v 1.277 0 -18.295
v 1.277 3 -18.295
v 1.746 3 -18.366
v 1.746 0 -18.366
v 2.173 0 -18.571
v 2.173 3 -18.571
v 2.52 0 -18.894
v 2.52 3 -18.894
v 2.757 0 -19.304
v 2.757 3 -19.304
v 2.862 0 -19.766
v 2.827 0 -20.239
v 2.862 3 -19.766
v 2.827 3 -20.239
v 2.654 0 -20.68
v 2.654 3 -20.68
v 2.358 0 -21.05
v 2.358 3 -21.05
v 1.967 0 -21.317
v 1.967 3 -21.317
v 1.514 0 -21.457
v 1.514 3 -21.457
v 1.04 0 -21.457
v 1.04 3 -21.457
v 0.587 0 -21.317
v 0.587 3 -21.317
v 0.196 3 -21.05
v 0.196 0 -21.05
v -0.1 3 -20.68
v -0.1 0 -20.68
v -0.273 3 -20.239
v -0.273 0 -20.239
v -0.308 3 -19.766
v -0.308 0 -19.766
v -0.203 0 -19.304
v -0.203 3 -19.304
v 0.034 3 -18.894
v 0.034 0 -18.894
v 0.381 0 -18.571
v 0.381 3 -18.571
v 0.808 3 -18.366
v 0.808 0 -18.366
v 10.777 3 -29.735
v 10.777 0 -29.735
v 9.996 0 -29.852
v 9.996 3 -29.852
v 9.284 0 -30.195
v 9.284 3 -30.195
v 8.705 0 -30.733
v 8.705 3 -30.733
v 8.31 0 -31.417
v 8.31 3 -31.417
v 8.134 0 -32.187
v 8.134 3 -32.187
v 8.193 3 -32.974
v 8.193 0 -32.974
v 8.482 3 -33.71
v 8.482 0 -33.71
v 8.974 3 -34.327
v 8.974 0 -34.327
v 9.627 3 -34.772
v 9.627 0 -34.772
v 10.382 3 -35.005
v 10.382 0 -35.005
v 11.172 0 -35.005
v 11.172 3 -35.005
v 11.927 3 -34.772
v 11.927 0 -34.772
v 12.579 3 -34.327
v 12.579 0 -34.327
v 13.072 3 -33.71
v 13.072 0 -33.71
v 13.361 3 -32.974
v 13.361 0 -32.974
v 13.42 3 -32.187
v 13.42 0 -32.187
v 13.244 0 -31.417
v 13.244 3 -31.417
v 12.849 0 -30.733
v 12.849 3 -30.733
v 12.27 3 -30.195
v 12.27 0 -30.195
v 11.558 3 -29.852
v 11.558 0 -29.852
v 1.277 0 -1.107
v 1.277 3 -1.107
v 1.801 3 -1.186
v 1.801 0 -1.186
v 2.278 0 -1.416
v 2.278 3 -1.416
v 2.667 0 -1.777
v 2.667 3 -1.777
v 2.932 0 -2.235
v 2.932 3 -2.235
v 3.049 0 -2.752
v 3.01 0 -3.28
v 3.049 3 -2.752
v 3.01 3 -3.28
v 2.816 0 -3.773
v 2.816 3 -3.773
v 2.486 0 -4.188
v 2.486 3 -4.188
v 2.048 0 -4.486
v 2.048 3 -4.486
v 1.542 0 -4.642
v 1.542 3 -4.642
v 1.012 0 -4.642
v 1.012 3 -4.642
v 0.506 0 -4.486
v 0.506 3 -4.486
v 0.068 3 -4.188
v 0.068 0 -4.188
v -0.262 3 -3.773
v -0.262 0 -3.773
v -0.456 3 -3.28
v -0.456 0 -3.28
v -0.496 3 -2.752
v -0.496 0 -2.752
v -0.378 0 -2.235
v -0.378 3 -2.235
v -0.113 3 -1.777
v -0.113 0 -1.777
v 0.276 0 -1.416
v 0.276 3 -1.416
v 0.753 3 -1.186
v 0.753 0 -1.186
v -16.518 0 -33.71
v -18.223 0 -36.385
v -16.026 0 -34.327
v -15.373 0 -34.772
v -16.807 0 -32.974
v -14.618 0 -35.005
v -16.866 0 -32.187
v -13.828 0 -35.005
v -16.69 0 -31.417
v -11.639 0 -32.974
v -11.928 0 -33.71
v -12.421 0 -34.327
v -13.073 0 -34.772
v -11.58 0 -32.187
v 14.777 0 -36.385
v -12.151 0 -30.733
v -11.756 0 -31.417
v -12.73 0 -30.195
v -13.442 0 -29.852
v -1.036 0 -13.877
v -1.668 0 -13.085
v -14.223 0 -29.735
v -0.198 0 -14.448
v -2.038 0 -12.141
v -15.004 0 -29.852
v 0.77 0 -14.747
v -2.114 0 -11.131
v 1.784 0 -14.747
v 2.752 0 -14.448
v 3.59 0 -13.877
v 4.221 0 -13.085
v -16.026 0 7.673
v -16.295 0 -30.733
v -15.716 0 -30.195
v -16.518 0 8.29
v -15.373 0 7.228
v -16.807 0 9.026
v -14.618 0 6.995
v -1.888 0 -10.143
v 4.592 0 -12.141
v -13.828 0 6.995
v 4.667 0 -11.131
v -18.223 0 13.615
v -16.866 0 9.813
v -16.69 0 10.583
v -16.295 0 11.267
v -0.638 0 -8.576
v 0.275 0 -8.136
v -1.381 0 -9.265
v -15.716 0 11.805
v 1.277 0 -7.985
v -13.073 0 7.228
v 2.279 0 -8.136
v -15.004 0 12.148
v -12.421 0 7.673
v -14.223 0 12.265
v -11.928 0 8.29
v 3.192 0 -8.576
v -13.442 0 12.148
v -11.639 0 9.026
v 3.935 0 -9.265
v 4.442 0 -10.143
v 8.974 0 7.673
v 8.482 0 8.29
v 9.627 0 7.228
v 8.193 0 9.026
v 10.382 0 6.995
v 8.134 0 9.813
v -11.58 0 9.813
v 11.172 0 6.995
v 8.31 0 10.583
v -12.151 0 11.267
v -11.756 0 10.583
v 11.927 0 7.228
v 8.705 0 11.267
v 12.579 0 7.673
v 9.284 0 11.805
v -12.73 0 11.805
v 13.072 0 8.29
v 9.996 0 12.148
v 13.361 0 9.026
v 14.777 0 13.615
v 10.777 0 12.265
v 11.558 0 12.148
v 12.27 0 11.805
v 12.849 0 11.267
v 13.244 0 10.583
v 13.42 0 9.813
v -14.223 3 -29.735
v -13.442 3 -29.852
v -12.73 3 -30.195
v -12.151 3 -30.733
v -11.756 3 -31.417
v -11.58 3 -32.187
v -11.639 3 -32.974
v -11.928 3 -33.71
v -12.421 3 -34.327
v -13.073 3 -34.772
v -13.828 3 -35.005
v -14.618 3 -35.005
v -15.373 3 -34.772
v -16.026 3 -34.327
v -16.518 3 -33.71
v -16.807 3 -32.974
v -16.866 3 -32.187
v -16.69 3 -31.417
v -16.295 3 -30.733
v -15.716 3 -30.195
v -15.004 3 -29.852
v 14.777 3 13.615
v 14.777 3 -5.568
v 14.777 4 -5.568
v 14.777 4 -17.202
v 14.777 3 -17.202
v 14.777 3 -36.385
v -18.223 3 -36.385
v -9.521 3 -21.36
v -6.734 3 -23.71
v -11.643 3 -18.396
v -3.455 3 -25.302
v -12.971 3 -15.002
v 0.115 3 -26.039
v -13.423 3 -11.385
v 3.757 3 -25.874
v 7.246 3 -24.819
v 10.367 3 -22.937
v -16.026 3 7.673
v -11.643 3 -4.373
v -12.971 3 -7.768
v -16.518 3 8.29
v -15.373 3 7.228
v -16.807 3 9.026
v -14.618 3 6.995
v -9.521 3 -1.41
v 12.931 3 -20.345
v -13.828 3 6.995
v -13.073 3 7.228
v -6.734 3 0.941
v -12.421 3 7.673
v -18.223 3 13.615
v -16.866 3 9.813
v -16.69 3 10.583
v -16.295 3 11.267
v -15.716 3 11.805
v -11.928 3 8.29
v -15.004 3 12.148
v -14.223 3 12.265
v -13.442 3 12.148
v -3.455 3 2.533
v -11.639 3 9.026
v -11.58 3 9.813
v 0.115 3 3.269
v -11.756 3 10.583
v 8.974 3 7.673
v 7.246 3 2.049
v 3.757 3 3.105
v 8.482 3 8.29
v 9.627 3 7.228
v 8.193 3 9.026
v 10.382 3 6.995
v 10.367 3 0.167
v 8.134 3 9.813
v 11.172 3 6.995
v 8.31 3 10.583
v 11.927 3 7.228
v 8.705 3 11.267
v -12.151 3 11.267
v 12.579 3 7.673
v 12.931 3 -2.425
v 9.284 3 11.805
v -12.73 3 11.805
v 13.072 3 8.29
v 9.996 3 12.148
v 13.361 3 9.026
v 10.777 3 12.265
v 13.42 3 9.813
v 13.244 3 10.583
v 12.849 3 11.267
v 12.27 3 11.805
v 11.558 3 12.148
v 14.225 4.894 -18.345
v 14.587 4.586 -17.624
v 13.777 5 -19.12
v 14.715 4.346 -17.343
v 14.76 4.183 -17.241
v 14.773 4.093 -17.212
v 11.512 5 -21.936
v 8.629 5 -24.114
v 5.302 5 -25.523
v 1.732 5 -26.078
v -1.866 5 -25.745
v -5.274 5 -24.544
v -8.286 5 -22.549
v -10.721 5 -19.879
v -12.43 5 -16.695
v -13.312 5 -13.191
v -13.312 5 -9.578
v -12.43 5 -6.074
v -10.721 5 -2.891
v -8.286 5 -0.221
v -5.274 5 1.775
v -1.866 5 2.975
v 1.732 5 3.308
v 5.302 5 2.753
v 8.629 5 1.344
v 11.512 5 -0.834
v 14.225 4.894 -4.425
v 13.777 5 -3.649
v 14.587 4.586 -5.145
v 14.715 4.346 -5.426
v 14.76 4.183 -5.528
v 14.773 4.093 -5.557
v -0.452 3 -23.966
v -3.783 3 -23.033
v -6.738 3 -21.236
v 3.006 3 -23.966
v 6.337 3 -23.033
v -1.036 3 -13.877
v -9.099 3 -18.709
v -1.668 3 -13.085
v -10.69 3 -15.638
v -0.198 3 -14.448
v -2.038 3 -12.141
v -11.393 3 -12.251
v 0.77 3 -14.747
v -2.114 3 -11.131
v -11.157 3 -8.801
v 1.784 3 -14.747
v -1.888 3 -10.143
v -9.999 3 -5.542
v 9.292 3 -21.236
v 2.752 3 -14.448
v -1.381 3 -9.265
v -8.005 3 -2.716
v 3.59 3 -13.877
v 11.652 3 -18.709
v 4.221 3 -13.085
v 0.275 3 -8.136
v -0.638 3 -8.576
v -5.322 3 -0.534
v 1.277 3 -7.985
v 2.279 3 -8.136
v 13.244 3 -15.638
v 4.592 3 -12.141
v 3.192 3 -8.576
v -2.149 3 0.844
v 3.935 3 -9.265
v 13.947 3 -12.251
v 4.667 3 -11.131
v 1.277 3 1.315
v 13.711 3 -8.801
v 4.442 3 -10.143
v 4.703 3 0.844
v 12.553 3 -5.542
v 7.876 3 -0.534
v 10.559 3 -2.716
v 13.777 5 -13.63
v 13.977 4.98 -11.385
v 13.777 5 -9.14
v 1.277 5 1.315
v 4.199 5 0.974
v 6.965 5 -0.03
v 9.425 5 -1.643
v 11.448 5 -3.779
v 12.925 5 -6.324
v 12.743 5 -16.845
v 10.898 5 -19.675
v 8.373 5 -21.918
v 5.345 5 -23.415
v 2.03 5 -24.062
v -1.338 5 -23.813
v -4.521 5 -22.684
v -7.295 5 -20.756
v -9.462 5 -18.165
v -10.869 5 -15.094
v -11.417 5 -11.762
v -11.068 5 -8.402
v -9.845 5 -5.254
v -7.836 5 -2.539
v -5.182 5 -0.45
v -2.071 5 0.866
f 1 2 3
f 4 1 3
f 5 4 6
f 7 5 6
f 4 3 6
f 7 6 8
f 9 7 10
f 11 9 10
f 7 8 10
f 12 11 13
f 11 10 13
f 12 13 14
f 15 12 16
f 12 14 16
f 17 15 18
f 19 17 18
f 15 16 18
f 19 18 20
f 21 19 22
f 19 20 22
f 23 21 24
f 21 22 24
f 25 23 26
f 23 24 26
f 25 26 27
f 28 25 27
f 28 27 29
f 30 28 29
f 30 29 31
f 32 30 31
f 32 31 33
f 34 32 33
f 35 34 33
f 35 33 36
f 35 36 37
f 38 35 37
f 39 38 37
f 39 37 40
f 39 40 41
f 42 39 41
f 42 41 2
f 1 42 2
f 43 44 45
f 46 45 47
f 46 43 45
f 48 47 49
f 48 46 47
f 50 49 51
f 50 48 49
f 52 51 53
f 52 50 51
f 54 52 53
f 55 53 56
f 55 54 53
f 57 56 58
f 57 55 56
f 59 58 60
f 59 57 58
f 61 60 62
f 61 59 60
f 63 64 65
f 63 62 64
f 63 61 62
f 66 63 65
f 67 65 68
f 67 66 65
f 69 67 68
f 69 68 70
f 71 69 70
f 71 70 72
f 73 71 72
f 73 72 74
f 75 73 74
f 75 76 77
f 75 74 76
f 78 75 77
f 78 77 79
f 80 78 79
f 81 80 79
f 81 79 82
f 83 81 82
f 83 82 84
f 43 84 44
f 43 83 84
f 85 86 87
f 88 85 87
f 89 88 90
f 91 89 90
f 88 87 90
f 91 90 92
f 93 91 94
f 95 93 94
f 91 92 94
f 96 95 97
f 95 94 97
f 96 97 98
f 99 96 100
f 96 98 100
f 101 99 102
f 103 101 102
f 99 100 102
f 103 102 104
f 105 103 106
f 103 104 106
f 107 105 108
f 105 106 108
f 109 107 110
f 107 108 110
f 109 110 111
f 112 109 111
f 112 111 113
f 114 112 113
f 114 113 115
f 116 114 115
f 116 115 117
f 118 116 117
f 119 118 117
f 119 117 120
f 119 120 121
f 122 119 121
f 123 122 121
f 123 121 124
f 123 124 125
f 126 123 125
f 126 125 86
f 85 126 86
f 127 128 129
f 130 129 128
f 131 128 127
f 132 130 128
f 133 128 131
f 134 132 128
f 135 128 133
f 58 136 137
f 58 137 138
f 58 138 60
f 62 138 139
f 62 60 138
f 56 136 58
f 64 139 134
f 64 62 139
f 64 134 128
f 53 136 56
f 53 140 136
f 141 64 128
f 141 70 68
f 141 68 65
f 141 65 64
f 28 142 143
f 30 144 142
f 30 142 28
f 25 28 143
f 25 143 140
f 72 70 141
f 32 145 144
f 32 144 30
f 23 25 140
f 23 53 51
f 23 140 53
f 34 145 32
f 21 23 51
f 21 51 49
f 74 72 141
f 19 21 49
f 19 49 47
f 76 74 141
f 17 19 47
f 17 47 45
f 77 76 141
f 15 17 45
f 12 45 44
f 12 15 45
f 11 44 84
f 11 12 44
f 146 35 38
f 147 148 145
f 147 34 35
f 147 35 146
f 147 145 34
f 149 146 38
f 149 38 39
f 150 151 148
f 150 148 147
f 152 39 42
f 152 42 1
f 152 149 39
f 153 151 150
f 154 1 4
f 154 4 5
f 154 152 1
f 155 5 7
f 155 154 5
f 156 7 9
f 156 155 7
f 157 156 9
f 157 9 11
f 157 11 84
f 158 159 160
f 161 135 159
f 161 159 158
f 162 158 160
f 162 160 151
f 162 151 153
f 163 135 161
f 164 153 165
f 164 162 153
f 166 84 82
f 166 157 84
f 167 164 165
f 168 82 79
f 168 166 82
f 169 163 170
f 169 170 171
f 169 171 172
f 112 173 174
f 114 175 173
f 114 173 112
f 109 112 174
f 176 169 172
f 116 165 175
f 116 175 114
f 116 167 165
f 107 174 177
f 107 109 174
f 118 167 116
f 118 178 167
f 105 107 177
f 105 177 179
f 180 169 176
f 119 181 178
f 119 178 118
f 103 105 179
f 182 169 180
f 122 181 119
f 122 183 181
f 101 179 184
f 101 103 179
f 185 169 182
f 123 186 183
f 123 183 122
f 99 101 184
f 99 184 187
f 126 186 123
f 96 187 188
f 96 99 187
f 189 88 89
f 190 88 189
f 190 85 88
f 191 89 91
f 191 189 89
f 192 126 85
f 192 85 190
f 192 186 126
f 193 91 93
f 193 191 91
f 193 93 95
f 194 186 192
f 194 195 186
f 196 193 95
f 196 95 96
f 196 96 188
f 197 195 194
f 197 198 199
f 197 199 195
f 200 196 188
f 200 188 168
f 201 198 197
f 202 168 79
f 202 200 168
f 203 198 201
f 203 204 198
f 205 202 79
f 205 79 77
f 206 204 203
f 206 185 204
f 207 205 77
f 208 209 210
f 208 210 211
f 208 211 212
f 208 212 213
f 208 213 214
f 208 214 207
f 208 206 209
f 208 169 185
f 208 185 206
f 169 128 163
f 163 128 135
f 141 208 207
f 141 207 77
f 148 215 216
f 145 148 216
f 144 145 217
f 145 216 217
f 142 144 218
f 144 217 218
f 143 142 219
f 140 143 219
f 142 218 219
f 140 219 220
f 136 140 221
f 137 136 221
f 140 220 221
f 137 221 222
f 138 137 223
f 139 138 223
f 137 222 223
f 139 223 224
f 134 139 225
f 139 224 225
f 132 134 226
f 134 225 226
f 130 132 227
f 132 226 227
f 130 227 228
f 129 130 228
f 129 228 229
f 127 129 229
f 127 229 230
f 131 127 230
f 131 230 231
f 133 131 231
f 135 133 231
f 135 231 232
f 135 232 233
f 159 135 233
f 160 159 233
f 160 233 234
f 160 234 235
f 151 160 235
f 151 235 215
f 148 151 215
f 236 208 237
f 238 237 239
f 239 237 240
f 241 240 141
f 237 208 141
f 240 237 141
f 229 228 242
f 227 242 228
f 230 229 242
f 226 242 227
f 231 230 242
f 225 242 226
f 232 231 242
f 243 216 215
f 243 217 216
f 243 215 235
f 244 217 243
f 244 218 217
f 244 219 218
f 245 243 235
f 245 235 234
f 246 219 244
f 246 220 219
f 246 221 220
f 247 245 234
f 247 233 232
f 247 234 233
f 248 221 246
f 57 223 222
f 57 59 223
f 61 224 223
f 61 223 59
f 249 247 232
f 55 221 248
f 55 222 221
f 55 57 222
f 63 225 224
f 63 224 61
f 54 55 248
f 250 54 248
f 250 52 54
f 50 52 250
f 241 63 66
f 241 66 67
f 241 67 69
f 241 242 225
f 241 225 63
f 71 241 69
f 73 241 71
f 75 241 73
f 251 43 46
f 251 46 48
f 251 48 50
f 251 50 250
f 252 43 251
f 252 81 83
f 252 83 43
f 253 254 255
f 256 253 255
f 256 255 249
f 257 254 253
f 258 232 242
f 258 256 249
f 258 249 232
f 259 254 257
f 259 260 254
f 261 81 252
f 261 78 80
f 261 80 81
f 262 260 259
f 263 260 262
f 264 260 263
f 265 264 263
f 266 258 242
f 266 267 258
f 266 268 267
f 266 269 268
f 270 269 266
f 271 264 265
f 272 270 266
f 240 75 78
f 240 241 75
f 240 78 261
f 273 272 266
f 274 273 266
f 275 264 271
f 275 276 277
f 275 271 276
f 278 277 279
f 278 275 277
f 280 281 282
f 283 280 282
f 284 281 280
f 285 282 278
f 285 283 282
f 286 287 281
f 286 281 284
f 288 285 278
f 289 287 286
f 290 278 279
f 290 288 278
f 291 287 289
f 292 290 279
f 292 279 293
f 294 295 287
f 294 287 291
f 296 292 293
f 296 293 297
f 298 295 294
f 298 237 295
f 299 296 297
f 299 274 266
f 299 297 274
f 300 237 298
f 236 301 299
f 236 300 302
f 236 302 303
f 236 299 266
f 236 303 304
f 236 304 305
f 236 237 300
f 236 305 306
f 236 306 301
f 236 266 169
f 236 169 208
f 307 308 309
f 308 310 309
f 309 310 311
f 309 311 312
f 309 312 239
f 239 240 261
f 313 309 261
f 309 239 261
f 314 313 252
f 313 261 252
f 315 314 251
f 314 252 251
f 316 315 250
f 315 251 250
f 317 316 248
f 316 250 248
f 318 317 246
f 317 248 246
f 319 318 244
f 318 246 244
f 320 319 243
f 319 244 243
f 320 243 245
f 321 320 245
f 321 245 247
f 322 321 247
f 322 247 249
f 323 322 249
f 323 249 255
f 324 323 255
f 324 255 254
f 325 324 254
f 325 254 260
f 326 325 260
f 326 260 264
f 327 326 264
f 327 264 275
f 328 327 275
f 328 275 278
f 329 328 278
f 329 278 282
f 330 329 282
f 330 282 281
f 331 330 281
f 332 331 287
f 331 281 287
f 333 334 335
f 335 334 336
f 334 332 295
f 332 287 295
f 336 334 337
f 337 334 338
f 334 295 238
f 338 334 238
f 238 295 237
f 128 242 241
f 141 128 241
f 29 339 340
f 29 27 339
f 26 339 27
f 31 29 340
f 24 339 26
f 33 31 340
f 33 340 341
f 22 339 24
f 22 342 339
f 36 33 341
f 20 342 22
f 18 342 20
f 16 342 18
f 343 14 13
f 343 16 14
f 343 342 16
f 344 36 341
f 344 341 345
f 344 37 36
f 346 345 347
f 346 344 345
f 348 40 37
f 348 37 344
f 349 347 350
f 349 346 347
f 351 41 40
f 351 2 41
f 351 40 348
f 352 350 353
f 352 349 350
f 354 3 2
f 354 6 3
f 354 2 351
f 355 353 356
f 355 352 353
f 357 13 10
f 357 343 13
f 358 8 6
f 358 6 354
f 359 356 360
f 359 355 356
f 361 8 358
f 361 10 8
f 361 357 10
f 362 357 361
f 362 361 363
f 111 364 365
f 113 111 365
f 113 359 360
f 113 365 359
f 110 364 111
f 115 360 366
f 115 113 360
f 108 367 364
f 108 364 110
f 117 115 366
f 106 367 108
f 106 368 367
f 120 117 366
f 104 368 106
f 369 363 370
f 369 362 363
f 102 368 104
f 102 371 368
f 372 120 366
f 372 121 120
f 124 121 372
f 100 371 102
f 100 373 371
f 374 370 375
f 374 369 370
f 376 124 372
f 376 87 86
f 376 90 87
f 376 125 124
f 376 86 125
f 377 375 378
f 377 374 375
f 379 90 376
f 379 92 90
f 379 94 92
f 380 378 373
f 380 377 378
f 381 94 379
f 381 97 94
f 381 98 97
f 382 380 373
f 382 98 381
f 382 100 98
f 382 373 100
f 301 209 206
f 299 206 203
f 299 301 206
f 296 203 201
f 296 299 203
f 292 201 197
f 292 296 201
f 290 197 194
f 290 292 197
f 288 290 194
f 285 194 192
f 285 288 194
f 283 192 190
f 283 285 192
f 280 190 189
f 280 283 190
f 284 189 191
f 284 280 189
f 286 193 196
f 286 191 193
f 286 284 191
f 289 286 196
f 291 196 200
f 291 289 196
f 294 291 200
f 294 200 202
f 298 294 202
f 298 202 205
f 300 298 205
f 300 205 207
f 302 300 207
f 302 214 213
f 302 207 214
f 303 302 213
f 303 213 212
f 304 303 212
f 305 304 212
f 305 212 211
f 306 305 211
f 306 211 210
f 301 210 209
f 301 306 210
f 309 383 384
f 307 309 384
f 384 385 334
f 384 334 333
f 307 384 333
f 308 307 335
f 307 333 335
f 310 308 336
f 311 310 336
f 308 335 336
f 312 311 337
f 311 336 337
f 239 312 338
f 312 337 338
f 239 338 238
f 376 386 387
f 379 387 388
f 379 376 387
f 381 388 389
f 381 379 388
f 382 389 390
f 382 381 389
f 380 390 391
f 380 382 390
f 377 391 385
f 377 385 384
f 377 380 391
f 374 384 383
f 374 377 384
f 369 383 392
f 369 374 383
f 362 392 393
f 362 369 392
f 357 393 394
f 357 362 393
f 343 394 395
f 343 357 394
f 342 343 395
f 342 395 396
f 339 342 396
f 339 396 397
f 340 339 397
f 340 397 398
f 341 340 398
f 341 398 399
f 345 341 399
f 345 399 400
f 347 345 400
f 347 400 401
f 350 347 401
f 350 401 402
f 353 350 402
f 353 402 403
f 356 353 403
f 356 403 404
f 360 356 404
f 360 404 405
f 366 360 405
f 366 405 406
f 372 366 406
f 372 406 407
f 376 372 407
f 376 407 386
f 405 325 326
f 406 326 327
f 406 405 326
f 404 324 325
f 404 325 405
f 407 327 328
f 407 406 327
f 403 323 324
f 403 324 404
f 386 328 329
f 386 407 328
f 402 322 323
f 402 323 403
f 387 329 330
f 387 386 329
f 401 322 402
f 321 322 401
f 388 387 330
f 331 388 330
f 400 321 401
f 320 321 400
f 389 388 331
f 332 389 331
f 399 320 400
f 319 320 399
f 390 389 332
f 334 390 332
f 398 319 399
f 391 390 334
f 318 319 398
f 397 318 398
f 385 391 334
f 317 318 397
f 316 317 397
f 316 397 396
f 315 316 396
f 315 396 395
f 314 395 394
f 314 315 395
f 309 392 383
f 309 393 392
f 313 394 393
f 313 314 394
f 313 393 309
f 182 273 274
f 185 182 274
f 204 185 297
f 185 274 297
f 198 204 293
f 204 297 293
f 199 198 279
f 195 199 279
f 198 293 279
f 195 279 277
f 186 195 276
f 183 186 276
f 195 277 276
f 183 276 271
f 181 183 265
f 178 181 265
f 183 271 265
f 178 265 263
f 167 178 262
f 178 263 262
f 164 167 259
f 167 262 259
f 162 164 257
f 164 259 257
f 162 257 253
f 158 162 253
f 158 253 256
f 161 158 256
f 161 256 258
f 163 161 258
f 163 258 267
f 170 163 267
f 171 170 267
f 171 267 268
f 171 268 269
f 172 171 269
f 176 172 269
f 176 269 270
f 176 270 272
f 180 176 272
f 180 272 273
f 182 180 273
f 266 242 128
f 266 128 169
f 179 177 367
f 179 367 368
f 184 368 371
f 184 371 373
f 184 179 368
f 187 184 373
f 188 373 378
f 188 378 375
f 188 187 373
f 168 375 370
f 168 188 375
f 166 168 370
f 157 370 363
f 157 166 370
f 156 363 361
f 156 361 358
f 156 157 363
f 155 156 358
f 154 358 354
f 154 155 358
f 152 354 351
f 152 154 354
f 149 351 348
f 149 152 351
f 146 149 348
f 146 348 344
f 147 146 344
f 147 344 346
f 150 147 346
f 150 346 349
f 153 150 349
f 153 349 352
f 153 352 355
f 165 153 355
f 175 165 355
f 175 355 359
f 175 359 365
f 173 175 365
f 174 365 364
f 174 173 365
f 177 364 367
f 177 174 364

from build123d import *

# Parameters (mm, degrees)
SKETCH1_W           = 25
SKETCH1_H           = 50
SKETCH1_R           = 3.4
BOSS_EXTRUDE1_DEPTH = 3
SKETCH2_W           = 50
SKETCH2_H           = 3
BOSS_EXTRUDE2_DEPTH = 8
SKETCH3_W           = 8
SKETCH3_H           = 50
BOSS_EXTRUDE3_DEPTH = 42
SKETCH4_R           = 2.65
CUT_EXTRUDE1_DEPTH  = 3.3
SKETCH5_R           = 5.802370205
CUT_EXTRUDE2_DEPTH  = 9
FILLET2_R           = 1
SKETCH6_R           = 12.7
BOSS_EXTRUDE4_DEPTH = 2
FILLET4_R           = 1
SKETCH8_R           = 1.589780168
SKETCH8_R_2         = 1.777428262
CUT_EXTRUDE3_DEPTH  = 10
SKETCH9_W           = 8
SKETCH9_H           = 42
CUT_EXTRUDE4_DEPTH  = 68.79439129


with BuildPart() as part:
    # Sketch1 → Boss-Extrude1 (new body)
    with BuildSketch(Plane(origin=(0, 0, 0), x_dir=(1, 0, 0), z_dir=(0, 1, 0))):
        with Locations((2.276951673, 11.384758364)):
            Rectangle(SKETCH1_W, SKETCH1_H)
        with Locations(Location((1.276951673, 11.384758364, 0), (0, 0, 270))):
            Circle(SKETCH1_R, mode=Mode.SUBTRACT)
    extrude(amount=BOSS_EXTRUDE1_DEPTH)

    # Sketch2 → Boss-Extrude2 (add)
    with BuildSketch(Plane.ZY.offset(10.223048327)):
        with Locations((-11.384758364, 1.5)):
            Rectangle(SKETCH2_W, SKETCH2_H)
    extrude(amount=BOSS_EXTRUDE2_DEPTH)

    # Sketch3 → Boss-Extrude3 (add)
    with BuildSketch(Plane.XZ):
        with Locations((-14.223048327, -11.384758364)):
            Rectangle(SKETCH3_W, SKETCH3_H)
    extrude(amount=BOSS_EXTRUDE3_DEPTH)

    # Sketch4 → Cut-Extrude1 (cut)
    with BuildSketch(Plane(origin=(0, 3, 0), x_dir=(1, 0, 0), z_dir=(0, 1, 0))):
        with Locations(Location((-14.223048327, 32.384758364, 0), (0, 0, 270))):
            Circle(SKETCH4_R)
        with Locations(Location((-14.223048327, -9.615241636, 0), (0, 0, 270))):
            Circle(SKETCH4_R)
    cut_extrude1 = extrude(amount=-CUT_EXTRUDE1_DEPTH, mode=Mode.SUBTRACT)

    # Mirror1: Cut-Extrude1 across plane
    add(cut_extrude1.mirror(Plane.ZX.offset(-19.5)), mode=Mode.SUBTRACT)

    # Sketch5 → Cut-Extrude2 (cut)
    with BuildSketch(Plane.ZY.offset(18.223048327)):
        with Locations((-11.836279124, -21)):
            Circle(SKETCH5_R)
    extrude(amount=-CUT_EXTRUDE2_DEPTH, mode=Mode.SUBTRACT)

    # Fillet2
    fillet2_edges = [part.edges().sort_by_distance(p)[0] for p in [
        (-10.223048327, -21, -17.638649329),
    ]]
    fillet(fillet2_edges, radius=FILLET2_R)

    # Mirror2: Cut-Extrude1 across plane
    add(cut_extrude1.mirror(Plane.ZY.offset(1.723048327)), mode=Mode.SUBTRACT)

    # Sketch6 → Boss-Extrude4 (add)
    with BuildSketch(Plane(origin=(0, 3, 0), x_dir=(1, 0, 0), z_dir=(0, 1, 0))):
        with BuildLine():
            Line((14.776951673, 5.567542535), (14.776951673, 17.201974193))
            ThreePointArc((14.776951673, 17.201974193), (-13.423048327, 11.384758364), (14.776951673, 5.567542535))
        make_face()
        with Locations(Location((1.276951673, 11.384758364, 0), (0, 0, 270))):
            Circle(SKETCH6_R, mode=Mode.SUBTRACT)
    extrude(amount=BOSS_EXTRUDE4_DEPTH)

    # Fillet4
    # the kernel refuses this fillet: 1 mm, written as the material it takes off along each edge
    with BuildSketch(Plane(origin=(14.776951673, 5, -3.067542535), x_dir=(0, -1, 0), z_dir=(0, 0, -1))) as fillet4_piece_1:
        with BuildLine():
            CenterArc((FILLET4_R, FILLET4_R), FILLET4_R, 180, 90)
            Line((0, FILLET4_R), (0, 0))
            Line((0, 0), (FILLET4_R, 0))
        make_face()
    extrude(amount=16.634431658, mode=Mode.SUBTRACT)

    # Sketch8 → Cut-Extrude3 (cut)
    with BuildSketch(Plane(origin=(0, 3, 0), x_dir=(1, 0, 0), z_dir=(0, 1, 0))):
        with Locations(Location((1.276951673, 19.884758364, 0), (0, 0, 270))):
            Circle(SKETCH8_R)
        with Locations(Location((1.276951673, 2.884758364, 0), (0, 0, 270))):
            Circle(SKETCH8_R_2)
    extrude(amount=-CUT_EXTRUDE3_DEPTH, mode=Mode.SUBTRACT)

    # Sketch9 → Cut-Extrude4 (cut, through all)
    with BuildSketch(Plane.XY.offset(13.615241636)):
        with Locations((-14.223048327, -21)):
            Rectangle(SKETCH9_W, SKETCH9_H)
    extrude(amount=-CUT_EXTRUDE4_DEPTH, mode=Mode.SUBTRACT)


solid = part.part
